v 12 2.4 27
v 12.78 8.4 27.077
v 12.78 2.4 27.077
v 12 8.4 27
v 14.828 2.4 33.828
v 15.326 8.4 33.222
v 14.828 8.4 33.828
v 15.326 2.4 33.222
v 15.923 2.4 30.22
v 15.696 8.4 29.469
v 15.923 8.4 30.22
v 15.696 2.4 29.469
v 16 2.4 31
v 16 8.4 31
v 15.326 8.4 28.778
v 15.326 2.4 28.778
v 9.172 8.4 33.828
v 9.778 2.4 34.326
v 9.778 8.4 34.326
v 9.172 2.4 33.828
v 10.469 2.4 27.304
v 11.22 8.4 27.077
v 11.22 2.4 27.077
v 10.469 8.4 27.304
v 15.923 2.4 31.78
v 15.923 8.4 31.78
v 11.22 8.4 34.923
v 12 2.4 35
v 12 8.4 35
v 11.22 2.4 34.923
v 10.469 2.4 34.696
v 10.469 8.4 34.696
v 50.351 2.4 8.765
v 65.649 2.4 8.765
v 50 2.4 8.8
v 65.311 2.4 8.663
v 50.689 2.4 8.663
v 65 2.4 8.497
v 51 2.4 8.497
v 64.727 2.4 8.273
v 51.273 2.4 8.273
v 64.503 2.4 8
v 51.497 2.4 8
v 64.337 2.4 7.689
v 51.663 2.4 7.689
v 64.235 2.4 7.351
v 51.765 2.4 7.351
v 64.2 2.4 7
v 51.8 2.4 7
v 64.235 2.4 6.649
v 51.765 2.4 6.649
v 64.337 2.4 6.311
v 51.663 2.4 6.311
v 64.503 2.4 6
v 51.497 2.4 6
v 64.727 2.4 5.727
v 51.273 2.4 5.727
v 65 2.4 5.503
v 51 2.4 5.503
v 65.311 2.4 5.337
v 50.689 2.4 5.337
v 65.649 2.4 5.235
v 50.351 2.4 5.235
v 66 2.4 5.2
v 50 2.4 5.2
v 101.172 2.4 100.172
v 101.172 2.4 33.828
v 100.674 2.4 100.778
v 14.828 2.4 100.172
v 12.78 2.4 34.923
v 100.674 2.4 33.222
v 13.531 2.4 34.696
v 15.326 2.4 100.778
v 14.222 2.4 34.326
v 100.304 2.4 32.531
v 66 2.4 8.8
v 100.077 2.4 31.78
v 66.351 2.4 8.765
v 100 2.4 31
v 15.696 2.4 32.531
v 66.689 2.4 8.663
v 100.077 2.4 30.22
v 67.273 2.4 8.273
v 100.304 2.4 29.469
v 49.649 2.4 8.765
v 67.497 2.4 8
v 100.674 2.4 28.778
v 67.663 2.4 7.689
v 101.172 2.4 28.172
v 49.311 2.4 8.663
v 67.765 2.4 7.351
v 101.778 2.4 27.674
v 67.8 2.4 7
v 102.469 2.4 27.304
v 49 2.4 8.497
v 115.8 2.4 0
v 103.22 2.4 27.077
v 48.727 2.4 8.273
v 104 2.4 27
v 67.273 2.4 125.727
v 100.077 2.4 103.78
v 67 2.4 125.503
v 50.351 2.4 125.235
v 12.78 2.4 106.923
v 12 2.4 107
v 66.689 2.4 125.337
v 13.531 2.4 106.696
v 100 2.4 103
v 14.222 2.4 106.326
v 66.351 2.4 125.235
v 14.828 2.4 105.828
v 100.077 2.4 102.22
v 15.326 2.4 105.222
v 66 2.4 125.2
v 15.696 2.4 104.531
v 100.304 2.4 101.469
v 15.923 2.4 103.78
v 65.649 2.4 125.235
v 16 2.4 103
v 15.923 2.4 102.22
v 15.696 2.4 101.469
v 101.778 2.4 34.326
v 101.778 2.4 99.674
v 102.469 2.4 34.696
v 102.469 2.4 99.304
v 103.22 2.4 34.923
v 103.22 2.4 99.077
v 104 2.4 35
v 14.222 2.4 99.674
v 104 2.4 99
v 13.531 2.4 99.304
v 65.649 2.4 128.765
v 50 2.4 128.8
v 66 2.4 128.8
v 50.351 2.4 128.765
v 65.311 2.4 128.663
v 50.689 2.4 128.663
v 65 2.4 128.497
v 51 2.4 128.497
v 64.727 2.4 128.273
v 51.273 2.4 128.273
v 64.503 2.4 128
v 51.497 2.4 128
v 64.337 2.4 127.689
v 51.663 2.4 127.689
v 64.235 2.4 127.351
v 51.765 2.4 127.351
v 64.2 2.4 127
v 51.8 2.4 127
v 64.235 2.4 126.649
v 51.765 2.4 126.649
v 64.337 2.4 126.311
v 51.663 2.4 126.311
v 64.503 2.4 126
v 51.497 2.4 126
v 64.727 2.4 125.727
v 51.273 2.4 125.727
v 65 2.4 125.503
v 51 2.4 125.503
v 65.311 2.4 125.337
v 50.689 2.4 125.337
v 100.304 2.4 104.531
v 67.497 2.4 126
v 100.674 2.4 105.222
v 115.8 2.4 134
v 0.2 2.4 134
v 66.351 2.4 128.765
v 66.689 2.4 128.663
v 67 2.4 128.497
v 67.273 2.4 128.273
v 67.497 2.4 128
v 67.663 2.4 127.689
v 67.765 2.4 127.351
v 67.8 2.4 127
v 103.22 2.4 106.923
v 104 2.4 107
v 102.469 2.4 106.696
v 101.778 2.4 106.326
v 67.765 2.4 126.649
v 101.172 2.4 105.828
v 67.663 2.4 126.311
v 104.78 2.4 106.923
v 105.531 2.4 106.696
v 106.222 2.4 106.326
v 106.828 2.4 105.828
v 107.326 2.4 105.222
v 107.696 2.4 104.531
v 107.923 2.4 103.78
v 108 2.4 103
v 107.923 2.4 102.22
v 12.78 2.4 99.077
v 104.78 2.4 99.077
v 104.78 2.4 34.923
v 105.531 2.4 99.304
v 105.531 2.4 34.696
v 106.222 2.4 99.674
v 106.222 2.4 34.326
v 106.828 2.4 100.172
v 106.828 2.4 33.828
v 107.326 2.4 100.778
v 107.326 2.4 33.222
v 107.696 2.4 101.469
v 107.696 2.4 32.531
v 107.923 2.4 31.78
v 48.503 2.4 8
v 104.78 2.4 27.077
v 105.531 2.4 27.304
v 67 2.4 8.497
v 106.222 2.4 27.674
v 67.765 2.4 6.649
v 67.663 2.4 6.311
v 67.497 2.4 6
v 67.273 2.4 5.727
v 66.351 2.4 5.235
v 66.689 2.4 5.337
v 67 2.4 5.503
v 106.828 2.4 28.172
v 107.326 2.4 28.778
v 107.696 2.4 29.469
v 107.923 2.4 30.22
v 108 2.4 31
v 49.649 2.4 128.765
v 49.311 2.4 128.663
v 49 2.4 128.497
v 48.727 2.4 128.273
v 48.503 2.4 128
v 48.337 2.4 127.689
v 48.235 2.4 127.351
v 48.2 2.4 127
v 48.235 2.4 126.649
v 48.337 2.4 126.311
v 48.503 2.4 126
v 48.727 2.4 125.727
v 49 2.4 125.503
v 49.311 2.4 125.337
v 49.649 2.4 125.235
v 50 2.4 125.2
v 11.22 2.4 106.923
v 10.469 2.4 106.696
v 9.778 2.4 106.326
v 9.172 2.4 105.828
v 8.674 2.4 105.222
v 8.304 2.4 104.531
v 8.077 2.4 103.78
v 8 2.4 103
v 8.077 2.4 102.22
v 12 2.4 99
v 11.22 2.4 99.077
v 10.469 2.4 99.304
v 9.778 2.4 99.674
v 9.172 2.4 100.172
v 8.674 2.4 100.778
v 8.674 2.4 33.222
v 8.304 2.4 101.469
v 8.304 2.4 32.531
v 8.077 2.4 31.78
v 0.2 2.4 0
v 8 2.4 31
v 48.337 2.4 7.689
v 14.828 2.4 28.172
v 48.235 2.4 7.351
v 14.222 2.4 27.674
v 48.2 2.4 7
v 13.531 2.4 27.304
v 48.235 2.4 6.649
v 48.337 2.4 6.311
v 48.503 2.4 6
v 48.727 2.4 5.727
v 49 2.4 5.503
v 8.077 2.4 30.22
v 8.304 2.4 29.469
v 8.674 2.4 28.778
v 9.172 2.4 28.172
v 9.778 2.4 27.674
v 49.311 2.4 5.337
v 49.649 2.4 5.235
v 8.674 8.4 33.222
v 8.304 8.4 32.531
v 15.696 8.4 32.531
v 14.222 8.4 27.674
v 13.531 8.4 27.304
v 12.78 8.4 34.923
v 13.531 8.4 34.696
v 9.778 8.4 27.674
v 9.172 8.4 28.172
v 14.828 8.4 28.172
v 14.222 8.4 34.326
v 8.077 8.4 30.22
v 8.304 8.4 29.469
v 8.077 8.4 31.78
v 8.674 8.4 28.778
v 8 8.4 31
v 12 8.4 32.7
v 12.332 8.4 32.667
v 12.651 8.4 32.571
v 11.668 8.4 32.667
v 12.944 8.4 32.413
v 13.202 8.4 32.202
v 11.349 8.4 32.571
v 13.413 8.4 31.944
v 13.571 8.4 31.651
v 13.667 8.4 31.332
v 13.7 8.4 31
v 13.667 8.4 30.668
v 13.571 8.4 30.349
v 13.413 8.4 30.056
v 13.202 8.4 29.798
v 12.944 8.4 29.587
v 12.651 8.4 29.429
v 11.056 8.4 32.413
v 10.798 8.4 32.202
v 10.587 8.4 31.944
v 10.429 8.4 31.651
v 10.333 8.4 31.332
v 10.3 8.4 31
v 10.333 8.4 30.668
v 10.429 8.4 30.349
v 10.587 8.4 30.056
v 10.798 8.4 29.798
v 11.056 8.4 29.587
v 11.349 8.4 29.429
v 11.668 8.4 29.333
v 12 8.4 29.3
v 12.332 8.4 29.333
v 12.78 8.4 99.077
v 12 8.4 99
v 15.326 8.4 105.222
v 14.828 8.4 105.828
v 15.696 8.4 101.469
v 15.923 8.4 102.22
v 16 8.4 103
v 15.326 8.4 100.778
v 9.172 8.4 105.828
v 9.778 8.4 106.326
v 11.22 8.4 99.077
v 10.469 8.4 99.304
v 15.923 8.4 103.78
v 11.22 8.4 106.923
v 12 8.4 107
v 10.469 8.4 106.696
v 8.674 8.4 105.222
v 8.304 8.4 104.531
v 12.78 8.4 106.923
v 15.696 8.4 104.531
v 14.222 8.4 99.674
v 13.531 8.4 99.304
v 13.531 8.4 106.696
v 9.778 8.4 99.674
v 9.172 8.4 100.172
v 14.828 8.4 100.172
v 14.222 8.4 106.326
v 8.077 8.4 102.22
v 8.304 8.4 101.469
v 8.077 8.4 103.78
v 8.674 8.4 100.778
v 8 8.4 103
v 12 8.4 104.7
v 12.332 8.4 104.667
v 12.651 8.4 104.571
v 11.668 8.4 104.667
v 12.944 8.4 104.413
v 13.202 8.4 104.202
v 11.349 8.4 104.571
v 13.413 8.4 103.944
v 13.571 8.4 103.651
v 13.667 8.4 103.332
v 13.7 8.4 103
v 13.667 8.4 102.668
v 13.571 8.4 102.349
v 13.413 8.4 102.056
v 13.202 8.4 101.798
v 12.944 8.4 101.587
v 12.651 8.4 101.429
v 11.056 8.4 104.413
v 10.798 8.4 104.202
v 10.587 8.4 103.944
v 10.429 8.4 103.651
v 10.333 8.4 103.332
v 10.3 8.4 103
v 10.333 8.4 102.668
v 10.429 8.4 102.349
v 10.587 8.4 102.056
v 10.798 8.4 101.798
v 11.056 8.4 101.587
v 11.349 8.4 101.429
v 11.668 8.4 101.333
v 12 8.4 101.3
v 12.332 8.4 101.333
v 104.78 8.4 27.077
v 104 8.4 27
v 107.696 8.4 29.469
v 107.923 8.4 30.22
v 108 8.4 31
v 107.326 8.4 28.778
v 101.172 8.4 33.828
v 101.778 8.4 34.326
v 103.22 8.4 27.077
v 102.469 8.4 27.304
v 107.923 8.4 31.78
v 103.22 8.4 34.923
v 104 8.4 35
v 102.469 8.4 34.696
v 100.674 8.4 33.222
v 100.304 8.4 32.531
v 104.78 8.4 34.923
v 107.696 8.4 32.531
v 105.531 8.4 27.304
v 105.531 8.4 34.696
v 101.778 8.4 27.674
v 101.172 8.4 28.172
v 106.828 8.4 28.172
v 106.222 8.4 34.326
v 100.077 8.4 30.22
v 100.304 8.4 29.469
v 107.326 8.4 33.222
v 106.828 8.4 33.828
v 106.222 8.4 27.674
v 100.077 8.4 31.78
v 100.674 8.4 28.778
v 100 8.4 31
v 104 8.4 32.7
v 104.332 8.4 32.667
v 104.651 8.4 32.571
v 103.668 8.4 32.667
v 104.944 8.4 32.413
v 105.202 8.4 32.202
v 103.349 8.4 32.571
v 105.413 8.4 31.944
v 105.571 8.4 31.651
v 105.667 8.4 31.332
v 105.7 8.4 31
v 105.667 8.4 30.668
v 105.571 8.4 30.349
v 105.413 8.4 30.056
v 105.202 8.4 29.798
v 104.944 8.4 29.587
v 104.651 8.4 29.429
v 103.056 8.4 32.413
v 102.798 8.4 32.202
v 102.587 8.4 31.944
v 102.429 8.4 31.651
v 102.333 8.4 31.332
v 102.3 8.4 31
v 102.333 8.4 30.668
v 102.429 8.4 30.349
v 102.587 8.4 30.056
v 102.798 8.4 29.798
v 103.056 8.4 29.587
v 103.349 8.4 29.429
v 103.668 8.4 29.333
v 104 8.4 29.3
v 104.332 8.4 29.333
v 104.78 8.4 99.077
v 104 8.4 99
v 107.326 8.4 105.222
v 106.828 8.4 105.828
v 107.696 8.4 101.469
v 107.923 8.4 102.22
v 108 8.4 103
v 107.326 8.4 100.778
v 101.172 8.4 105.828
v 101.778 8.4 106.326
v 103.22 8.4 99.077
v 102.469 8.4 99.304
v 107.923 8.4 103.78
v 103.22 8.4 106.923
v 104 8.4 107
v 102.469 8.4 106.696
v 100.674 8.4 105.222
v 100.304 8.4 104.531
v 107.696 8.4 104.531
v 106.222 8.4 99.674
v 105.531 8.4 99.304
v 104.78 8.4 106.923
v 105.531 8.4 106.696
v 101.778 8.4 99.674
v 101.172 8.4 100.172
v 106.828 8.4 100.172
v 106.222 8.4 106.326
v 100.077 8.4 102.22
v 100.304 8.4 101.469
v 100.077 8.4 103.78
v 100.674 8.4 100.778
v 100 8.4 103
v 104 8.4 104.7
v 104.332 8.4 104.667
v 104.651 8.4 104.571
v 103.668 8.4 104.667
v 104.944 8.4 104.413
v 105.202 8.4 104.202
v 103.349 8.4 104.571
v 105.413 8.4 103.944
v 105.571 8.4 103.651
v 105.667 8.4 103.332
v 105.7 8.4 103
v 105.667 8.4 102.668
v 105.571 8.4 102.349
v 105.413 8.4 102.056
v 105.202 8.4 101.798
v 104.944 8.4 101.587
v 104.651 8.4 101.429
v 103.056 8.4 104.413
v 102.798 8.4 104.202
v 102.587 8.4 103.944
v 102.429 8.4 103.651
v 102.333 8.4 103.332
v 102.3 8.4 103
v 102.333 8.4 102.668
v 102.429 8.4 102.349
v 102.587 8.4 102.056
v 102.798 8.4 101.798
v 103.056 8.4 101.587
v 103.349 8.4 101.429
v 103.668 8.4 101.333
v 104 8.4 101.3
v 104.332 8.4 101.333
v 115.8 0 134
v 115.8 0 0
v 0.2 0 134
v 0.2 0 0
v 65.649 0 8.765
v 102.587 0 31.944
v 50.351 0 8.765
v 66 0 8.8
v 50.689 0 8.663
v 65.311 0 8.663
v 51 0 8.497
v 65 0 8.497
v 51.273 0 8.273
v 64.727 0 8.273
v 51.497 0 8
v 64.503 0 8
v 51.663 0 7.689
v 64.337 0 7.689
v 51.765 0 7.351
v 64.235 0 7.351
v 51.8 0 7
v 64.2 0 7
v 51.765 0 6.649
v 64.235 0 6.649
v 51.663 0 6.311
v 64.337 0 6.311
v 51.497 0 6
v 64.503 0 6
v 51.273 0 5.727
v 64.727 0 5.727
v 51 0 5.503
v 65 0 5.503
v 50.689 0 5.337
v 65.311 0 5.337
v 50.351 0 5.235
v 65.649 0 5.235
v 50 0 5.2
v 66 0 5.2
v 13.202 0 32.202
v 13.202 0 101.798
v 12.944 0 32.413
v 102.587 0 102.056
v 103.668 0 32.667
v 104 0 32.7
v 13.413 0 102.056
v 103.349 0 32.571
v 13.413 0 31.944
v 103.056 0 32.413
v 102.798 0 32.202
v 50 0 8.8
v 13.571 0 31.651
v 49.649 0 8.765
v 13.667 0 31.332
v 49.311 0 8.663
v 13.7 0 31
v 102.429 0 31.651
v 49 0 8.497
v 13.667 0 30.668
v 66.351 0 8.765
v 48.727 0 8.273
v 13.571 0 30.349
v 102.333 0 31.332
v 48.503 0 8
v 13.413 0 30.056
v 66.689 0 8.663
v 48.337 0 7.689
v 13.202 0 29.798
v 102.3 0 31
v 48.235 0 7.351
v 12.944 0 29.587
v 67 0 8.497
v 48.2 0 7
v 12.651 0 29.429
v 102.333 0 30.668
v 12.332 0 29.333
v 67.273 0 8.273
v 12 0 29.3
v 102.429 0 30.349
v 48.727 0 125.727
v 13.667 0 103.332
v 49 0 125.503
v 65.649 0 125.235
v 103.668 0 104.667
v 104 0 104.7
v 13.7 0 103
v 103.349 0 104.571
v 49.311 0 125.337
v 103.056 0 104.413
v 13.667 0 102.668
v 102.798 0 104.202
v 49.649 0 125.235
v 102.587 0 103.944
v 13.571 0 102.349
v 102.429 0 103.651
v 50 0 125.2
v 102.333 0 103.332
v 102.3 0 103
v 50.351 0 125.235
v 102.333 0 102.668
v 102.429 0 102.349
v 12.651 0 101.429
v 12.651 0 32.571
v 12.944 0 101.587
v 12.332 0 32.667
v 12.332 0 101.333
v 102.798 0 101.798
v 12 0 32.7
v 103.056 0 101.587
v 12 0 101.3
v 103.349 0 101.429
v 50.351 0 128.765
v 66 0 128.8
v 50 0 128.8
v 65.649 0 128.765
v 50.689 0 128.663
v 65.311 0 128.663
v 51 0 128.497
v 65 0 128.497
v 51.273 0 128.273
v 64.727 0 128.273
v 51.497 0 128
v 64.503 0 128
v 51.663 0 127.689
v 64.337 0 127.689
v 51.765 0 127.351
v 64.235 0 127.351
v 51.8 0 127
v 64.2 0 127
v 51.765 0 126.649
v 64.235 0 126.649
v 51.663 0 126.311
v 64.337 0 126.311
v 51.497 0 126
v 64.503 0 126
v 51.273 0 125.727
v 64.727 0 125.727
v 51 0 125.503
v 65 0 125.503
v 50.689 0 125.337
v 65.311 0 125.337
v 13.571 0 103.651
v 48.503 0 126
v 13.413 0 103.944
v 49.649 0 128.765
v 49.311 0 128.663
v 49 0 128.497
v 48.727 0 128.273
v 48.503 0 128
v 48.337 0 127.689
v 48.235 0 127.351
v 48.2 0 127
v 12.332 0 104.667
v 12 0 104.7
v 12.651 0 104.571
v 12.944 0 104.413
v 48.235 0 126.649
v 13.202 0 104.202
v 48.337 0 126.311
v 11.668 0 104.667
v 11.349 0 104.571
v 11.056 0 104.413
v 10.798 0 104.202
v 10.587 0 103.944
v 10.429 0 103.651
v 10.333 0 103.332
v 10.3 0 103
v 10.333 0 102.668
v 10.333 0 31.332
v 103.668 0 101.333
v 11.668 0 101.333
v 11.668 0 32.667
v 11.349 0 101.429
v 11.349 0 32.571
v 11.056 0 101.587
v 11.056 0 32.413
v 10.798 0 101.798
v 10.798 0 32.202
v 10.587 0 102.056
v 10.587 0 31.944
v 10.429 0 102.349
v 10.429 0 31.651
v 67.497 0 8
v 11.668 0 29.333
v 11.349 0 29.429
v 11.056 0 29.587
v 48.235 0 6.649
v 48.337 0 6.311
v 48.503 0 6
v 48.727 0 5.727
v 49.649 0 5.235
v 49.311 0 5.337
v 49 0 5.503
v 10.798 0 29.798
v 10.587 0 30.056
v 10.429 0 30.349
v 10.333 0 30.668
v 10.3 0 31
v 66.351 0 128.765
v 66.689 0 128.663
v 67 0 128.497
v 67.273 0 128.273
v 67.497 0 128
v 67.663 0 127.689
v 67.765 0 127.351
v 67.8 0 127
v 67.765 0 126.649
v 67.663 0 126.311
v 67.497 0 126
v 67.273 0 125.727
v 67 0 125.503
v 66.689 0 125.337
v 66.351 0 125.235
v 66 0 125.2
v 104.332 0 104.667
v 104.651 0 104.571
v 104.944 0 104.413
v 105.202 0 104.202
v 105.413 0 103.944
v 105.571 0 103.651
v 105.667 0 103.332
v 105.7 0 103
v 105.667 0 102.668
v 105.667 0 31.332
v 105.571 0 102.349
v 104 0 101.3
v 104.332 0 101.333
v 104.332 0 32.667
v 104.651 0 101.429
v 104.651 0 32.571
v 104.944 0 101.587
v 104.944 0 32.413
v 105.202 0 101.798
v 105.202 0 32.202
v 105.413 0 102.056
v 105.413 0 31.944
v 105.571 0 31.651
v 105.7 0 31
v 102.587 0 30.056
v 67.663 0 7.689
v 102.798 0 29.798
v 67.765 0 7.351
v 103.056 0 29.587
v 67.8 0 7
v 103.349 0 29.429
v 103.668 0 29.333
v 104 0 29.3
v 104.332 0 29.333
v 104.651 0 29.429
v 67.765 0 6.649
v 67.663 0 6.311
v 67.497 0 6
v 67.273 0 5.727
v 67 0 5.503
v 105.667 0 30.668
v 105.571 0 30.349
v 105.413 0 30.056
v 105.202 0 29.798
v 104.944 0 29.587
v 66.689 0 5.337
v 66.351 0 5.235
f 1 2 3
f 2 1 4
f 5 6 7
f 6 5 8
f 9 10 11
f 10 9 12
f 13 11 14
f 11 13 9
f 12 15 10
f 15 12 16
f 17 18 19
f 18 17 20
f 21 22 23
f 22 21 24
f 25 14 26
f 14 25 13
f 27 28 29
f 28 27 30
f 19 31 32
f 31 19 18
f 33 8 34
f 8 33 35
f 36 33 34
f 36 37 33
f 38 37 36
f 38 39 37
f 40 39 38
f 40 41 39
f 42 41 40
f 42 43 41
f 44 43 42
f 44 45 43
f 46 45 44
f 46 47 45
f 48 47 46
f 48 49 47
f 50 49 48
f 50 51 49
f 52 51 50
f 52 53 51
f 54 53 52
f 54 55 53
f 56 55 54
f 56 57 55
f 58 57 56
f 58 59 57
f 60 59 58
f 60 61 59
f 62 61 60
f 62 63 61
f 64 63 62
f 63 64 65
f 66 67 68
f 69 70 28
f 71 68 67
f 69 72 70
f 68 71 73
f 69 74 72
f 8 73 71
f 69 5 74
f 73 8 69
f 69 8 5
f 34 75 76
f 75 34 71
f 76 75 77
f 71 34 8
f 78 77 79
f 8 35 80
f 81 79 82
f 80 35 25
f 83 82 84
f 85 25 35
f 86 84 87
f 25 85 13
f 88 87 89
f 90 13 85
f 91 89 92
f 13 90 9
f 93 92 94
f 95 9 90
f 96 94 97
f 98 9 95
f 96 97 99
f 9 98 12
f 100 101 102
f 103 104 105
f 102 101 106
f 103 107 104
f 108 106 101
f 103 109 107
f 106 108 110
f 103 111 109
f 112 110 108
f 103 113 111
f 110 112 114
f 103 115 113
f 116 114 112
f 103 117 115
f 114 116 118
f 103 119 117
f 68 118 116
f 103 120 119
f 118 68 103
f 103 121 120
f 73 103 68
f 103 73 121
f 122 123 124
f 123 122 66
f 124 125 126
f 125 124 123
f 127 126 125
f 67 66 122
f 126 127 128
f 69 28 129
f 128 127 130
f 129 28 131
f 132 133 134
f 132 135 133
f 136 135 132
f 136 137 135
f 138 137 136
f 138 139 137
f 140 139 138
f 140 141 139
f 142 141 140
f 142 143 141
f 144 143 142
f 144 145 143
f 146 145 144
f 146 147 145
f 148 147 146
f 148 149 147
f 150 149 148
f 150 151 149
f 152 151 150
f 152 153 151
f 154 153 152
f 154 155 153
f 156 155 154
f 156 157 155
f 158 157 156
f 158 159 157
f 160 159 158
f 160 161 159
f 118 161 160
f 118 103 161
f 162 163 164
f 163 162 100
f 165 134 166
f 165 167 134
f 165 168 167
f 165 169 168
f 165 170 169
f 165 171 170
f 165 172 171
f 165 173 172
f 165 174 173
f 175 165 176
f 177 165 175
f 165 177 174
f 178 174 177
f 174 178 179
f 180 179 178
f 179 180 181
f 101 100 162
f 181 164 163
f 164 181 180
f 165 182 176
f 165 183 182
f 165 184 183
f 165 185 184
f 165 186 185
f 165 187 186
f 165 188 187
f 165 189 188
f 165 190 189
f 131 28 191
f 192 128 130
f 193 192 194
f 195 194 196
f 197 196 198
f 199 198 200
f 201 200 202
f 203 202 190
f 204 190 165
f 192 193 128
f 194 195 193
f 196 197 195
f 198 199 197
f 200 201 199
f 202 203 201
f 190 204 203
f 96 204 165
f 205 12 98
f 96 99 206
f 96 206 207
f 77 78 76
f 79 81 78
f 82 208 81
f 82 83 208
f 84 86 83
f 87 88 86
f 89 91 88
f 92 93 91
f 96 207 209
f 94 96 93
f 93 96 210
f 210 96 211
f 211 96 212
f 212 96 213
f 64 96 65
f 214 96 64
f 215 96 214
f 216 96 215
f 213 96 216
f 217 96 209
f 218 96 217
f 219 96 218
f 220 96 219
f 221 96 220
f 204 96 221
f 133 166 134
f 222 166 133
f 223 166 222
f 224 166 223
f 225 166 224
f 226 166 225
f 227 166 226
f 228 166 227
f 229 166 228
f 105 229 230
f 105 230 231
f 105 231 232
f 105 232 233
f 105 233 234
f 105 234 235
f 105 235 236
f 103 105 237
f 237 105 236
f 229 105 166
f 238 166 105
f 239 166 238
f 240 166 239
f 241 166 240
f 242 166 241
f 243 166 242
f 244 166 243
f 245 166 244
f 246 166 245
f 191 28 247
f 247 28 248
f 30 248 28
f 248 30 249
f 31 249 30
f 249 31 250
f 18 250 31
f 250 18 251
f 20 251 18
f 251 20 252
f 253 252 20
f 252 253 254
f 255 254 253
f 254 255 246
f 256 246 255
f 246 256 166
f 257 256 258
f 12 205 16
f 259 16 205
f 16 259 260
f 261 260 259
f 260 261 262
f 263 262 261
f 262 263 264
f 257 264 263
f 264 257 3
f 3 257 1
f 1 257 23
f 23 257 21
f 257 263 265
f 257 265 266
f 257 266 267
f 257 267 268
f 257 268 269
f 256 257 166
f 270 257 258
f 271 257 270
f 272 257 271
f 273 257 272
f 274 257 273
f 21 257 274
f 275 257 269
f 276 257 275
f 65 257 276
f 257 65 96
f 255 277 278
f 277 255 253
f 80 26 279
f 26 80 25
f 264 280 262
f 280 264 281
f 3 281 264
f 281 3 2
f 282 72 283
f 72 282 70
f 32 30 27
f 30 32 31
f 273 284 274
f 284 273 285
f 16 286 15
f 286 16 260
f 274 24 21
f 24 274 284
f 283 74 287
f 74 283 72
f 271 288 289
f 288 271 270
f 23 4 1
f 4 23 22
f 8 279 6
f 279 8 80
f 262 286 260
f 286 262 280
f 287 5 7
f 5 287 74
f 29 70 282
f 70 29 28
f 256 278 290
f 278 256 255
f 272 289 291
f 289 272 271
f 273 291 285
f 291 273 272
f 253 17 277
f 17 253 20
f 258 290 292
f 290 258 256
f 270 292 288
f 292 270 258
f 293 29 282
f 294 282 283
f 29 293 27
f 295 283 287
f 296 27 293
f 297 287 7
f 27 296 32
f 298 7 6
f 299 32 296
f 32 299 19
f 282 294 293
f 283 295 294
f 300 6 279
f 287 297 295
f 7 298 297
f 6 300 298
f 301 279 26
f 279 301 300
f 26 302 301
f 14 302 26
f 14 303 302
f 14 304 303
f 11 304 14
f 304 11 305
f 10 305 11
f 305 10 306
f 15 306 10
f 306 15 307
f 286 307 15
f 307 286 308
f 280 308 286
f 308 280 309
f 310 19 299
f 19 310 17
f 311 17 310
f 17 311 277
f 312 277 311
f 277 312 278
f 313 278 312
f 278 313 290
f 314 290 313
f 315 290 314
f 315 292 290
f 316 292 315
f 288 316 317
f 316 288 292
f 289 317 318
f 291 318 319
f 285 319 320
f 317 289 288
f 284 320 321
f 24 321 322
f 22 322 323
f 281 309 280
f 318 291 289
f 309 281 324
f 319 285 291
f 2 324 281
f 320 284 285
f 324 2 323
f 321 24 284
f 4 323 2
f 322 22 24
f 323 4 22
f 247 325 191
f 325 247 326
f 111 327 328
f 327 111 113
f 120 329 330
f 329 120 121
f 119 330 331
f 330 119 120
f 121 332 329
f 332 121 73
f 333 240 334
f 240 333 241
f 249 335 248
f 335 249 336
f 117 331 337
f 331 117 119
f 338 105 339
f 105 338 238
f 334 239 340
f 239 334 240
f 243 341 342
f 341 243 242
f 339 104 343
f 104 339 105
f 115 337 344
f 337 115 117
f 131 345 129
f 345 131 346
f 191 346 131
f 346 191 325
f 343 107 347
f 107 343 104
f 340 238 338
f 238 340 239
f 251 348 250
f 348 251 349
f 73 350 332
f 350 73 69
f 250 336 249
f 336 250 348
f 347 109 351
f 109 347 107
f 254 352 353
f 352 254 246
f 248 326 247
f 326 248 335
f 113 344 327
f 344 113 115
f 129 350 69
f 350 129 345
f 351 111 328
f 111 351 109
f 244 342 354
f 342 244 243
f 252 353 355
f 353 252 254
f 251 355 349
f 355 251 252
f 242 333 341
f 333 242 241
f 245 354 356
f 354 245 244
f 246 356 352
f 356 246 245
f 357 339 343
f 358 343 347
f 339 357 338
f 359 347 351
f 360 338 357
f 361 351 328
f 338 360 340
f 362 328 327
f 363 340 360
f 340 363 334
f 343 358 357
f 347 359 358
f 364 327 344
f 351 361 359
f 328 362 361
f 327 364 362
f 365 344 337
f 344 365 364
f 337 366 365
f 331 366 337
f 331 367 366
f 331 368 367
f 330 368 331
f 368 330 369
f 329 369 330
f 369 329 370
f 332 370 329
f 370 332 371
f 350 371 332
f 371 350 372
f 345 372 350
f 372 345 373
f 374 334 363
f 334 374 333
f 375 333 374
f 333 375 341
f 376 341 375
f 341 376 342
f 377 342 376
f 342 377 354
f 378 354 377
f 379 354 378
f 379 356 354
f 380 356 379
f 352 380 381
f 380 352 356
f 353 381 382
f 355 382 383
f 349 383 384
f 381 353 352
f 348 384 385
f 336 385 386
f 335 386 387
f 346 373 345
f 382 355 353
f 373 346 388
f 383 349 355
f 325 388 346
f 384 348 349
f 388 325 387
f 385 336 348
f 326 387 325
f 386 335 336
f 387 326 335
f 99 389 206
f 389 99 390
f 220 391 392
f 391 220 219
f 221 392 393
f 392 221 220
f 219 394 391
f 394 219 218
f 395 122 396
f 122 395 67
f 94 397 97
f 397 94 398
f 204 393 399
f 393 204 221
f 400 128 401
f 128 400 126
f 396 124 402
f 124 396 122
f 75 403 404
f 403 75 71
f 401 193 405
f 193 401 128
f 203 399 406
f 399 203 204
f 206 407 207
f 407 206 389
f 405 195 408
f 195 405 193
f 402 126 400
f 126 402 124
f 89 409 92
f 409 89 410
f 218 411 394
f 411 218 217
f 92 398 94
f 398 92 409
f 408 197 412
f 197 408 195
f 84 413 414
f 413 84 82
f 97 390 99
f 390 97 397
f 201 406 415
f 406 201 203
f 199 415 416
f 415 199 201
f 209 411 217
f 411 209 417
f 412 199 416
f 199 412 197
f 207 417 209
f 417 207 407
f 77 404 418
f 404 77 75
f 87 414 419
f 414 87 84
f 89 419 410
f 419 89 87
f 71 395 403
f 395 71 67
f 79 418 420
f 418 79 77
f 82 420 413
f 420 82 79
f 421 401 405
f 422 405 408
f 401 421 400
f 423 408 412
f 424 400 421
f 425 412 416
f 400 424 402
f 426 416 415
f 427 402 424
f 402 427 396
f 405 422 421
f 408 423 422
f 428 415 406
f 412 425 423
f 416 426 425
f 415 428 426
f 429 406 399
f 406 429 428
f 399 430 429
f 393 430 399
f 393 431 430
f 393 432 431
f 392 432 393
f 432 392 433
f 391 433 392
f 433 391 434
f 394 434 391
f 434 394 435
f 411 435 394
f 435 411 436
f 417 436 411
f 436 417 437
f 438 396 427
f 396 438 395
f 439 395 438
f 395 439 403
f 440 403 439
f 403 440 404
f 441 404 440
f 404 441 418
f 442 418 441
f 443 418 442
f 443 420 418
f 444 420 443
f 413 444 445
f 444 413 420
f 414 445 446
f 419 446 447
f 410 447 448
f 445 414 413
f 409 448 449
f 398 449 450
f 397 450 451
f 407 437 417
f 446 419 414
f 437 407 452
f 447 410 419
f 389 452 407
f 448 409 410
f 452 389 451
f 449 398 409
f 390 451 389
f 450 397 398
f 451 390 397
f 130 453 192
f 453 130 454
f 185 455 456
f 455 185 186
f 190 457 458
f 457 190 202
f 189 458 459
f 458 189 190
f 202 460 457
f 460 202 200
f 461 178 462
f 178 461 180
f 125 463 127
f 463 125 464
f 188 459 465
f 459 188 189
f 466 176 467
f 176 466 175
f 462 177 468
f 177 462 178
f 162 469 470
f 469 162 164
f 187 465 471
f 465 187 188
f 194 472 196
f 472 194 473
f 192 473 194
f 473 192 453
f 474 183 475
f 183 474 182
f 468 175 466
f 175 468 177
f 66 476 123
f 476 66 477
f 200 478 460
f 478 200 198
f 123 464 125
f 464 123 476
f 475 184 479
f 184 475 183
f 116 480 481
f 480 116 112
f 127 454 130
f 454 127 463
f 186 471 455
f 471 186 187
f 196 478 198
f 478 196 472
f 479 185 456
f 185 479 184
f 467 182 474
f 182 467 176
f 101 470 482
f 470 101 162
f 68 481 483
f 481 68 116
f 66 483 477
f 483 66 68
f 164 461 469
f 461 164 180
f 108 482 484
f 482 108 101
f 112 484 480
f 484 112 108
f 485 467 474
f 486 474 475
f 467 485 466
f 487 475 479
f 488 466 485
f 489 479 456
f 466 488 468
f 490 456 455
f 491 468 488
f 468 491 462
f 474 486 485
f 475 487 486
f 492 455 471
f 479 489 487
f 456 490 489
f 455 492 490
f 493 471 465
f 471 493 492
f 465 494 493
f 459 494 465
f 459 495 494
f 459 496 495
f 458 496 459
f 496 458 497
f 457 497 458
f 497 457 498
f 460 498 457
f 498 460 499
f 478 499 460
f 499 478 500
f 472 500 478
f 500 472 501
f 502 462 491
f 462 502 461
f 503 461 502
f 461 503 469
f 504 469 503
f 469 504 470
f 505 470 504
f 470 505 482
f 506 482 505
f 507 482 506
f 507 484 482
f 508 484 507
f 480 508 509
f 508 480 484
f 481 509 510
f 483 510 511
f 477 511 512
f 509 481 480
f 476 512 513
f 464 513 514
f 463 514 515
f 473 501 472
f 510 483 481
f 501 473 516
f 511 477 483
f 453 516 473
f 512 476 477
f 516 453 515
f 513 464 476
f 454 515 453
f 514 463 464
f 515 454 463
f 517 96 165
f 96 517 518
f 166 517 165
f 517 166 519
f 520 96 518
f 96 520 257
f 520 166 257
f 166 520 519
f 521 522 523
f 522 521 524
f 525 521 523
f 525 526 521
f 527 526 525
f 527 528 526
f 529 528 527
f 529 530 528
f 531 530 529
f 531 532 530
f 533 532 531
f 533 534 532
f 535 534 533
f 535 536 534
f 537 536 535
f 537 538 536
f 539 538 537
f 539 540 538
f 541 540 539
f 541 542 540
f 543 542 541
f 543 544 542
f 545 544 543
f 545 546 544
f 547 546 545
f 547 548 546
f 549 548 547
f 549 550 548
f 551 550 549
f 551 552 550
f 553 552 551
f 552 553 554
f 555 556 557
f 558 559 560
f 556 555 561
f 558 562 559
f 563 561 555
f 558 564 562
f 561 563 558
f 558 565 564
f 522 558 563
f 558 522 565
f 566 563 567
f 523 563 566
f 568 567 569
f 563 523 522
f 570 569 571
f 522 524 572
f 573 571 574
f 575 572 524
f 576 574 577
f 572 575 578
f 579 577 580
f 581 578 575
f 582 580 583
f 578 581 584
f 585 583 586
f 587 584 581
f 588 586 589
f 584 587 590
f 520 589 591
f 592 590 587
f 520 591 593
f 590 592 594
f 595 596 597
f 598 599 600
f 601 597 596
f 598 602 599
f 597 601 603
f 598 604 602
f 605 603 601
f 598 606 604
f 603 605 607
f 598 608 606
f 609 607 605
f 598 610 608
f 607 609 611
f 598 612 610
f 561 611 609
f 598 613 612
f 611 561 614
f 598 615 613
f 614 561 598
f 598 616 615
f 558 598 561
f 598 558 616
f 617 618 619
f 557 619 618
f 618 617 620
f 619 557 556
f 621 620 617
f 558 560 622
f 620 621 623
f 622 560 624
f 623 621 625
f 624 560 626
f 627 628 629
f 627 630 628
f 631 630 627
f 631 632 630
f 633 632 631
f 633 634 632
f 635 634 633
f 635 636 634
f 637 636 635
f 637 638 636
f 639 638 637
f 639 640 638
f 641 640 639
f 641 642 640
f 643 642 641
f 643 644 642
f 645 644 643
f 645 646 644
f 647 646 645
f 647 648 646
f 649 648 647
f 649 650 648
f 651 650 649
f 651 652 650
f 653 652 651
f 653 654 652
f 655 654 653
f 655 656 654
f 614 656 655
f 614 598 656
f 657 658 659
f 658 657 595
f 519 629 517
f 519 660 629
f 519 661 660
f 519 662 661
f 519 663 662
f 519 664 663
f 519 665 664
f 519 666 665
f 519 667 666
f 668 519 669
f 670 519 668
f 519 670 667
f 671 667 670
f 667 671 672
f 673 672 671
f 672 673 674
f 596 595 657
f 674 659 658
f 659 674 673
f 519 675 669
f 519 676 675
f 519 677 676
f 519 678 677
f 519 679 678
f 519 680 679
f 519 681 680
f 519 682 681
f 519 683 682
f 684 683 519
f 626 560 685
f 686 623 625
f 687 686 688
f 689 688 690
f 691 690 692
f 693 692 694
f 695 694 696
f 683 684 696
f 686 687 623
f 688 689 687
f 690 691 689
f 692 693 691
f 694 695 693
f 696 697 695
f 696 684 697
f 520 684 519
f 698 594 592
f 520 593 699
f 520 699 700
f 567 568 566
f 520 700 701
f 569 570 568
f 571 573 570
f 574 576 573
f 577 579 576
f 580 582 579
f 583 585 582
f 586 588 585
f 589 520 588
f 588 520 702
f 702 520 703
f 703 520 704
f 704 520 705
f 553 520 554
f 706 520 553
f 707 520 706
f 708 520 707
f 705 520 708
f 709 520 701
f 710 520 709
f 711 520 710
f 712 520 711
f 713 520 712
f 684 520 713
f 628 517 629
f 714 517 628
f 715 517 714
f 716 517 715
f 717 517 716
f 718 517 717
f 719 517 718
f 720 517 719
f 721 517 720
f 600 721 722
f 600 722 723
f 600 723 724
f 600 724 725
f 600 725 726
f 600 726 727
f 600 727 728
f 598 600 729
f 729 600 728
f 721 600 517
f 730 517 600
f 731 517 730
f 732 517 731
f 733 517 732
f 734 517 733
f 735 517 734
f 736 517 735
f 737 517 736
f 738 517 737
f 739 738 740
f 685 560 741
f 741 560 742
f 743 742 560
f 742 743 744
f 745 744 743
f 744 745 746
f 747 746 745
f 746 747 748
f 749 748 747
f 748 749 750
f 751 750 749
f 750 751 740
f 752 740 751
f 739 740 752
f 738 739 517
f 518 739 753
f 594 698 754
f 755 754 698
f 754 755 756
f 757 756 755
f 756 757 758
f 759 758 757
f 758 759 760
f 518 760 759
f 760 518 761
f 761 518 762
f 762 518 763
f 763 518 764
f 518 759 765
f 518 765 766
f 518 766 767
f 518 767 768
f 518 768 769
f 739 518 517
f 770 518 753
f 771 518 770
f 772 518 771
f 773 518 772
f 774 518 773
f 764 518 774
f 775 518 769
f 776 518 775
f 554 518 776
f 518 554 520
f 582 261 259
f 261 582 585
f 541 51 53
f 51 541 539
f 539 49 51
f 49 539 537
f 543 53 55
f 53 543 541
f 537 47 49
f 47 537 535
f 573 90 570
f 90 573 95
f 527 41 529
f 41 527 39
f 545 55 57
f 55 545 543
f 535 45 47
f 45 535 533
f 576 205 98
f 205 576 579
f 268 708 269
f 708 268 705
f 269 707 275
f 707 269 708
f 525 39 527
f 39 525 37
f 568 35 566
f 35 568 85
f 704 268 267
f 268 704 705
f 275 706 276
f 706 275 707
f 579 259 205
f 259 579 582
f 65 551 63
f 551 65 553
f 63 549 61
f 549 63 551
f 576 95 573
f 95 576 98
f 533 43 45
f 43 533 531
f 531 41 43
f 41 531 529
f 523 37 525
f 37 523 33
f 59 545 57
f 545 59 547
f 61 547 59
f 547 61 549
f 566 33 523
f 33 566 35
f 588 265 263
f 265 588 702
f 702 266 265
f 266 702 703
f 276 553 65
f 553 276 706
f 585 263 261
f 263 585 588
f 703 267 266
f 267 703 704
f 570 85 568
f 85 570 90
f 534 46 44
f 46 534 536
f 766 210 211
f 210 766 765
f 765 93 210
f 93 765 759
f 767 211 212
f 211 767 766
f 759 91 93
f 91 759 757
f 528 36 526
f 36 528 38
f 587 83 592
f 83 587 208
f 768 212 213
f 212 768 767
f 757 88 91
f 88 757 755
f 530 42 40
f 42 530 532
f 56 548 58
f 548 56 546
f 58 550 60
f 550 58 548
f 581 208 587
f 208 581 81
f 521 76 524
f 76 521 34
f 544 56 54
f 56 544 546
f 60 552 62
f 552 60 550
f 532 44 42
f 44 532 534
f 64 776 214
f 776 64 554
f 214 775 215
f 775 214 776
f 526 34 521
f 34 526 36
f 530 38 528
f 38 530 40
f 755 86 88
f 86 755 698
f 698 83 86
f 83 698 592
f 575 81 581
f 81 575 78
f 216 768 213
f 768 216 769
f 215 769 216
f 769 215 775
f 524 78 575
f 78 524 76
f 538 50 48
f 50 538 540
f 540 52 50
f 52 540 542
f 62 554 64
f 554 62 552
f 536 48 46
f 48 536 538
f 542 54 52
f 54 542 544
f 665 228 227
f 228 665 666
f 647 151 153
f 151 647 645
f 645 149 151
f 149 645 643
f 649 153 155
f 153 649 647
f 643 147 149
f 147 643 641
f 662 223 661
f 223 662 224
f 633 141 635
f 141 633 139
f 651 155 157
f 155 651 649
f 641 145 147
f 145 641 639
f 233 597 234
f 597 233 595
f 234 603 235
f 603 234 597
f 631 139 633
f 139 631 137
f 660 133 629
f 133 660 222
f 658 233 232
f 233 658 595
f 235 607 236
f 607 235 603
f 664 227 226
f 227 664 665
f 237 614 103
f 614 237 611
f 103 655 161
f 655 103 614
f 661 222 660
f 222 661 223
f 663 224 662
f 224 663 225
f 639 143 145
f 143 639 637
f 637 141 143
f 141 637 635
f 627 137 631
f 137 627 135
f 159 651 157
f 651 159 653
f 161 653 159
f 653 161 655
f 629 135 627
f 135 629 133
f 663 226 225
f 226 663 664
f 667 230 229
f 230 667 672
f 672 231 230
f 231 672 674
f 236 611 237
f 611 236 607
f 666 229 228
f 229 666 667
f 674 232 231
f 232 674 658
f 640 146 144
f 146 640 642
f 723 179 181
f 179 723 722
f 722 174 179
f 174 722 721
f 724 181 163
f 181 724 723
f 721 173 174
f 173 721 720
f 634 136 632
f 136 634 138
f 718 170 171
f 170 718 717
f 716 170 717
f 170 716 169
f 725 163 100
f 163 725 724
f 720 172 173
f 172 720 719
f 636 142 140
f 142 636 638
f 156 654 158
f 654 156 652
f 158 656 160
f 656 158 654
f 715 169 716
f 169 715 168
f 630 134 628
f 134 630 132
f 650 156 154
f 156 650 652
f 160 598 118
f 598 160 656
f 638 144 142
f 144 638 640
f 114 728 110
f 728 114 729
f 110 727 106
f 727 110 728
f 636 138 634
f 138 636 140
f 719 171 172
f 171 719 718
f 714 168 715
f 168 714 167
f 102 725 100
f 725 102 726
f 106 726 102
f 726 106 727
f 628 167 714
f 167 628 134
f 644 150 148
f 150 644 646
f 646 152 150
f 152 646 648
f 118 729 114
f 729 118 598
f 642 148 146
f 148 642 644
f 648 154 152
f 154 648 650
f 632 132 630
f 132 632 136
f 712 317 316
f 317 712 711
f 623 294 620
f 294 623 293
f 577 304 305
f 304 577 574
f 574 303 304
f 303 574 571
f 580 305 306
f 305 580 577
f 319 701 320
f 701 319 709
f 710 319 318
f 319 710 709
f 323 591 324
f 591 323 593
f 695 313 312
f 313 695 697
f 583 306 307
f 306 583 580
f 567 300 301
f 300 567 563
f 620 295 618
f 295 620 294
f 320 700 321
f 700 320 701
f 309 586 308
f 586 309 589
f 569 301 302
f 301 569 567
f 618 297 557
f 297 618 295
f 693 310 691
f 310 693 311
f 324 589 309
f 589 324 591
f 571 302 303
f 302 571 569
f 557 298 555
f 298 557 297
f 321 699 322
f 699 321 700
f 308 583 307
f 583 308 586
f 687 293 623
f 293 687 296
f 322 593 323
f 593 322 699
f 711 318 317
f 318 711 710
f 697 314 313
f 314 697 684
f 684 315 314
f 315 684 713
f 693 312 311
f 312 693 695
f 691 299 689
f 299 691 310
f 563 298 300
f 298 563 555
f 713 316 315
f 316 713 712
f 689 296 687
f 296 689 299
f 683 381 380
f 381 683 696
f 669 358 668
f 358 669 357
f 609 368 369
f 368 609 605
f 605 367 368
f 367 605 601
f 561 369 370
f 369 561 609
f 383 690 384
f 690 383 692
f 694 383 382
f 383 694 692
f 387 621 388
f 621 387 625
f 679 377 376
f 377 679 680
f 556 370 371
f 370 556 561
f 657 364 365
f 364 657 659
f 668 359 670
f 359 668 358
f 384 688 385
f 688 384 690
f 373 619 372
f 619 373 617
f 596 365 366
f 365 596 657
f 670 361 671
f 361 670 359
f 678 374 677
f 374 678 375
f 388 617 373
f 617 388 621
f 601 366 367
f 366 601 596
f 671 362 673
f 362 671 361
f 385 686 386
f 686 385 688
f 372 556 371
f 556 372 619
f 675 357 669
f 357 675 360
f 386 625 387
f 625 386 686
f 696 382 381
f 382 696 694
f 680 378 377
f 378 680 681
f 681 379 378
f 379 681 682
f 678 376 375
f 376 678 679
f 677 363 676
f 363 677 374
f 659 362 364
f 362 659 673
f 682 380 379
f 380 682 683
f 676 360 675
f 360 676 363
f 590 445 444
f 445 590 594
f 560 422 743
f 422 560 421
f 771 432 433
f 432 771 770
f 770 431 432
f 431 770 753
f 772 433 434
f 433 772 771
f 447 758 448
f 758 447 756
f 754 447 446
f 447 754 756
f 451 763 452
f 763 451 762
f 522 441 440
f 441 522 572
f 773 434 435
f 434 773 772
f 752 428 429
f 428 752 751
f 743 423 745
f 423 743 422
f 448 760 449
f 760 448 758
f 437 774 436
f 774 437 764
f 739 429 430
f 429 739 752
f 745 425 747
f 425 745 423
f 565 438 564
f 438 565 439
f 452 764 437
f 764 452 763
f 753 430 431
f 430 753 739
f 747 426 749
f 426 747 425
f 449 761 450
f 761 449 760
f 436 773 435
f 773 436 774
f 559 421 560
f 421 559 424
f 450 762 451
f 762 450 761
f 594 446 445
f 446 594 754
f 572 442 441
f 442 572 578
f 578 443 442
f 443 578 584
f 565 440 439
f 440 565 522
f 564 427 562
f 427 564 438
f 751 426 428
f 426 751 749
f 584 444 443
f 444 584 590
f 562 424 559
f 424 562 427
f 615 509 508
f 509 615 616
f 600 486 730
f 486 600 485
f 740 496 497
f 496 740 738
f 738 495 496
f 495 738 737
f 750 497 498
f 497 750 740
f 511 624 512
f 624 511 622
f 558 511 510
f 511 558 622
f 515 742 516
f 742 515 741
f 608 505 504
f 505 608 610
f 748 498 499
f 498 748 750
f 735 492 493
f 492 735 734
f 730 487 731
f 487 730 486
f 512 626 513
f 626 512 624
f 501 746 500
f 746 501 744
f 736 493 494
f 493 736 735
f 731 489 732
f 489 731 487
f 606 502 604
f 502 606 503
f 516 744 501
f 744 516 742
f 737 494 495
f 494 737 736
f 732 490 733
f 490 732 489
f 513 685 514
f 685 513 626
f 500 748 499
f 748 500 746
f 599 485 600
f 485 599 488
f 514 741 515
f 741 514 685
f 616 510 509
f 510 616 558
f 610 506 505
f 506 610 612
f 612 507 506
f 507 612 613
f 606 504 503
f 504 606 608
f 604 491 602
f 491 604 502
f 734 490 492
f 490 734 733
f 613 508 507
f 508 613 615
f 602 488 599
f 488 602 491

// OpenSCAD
// file: ../params.scad
// Общие размеры первой итерации: один отсек 3.5" и детали вокруг него.
// Корпус диска — SFF-8301, таблица 3-1, класс высоты 26.10 мм (максимум).
// Положение разъёма SATA сюда не зашито: его снимают калибром gauge.scad
// с конкретного диска и только потом переносят в окно салазок.

drive_width = 101.60;
drive_height = 26.10;
drive_length = 147.00;

wall = 4.0;
floor_t = 4.0;
lip_t = 3.0;
nib = 4.0;
side_clearance = 0.8;
top_clearance = 1.5;

front_gap = 3.0;
plate_t = 8.0;
front_extra = front_gap + plate_t;

pusher_d = 4.4;
m3_clear = 3.4;
m3_pilot = 2.6;
m3_nut_af = 5.5;
m3_nut_t = 2.8;

cavity_w = drive_width + side_clearance;
outer_w = cavity_w + 2 * wall;
wall_h = drive_height + top_clearance;
body_z = drive_length + front_extra;

strap_z = 18;
strap_t = 4.0;
strap_foot = 14.0;

plate_screw_x = [14, drive_width - 14];
plate_z0 = drive_length + front_gap;
plate_screw_z = plate_z0 + plate_t / 2;
plate_bar_h = 10;
tower_w = 28;
tower_x = drive_width / 2 - tower_w / 2;

sled_w = 78;
sled_h = 48;
sled_t = 8;
sled_window_w = 50;
sled_window_h = 18;
sled_hole_inset = 6;

// Каркас 1U. Шаг EIA — 44.45 мм, уголок 44.0 мм, чтобы соседний юнит не тёрся.
// Гнездо 8.4 мм принимает трубку до 8 мм. Хомут тянет её к внешней стенке гнезда.
// При rod_d = 6 между трубками 29 мм: пол корзины 1.6 мм, диск 26.1 мм, воздух ~1 мм.
// При 8 мм диск 26.1 мм в этот юнит уже не входит.
unit_h = 44.0;
rod_d = 6;
socket_d = 8.4;
// 10 мм хватает, чтобы трубка села и хомут её зажал. Столбик тогда 12 мм,
// и четыре корзины остаются внутри просвета 450 мм.
socket_depth = 10;
socket_wall = 1.6;
skin = 0.8;
foot = 1.6;
roof = 1.4;
tie_w = 3.2;
// Просвет между направляющими стойки 19 дюймов — 450 мм.
opening_w = 450;
bay_count = 4;
bay_gap = 1.0;
basket_wall = 1.6;
basket_clear = 0.6;
rail_t = 1.6;
// Торец разъёма выступает за ближнюю трубку к каретке, чтобы трубка не перекрыла SATA.
plug_overhang = 16;
stop_margin = 14;

socket_r = socket_d / 2;
post_x = socket_depth + 2;
axis_inset = skin + socket_r;
bottom_axis_y = foot + socket_r;
top_axis_y = unit_h - roof - socket_r;
depth_z0 = axis_inset + socket_r + socket_wall;
post_z = depth_z0 + socket_depth;
basket_w = drive_width + basket_clear + 2 * basket_wall;
inner_w = bay_count * basket_w + (bay_count - 1) * bay_gap;
frame_w = inner_w + 2 * post_x;
rod_span = drive_length - plug_overhang + stop_margin;
frame_depth = rod_span + 2 * axis_inset;
rod_y0 = foot + rod_d / 2;
rod_y1 = unit_h - roof - rod_d / 2;
rod_gap = (rod_y1 - rod_d / 2) - (rod_y0 + rod_d / 2);

// KW11-3Z: корпус около 19.8 x 10.2 x 6.4 мм, два отверстия 2.35–2.5 мм
// с шагом 9.5 мм под винты M2.
switch_hole_d = 2.5;
switch_pitch = 9.5;

$fn = 32;
// file: params.scad
// Наборный ярус. Стоит рядом с cad/rack.scad и ту стойку не заменяет.
// Диск, юнит, гнездо 8.4 мм и ширина четырёх отсеков — из ../params.scad.
// Здесь их не копируют: если правка там, ярус подхватит её сам.
include <../params.scad>

$fn = 32;

// Сборка на трубке 6 мм. Гнездо принимает и 8 мм, но тогда диск 26.1 мм
// в юнит 44 мм уже не входит: между трубками остаётся около 29 мм.
m4_clear = 4.4;
board_t = 1.6;
standoff_h = 6;
comp_max = 10;
tray_t = 2.4;
tie_hole = 3.6;

// Плата Pi 4: 85 × 56 мм. Отверстия Ø2.7 под M2.5, шаг 58 × 49,
// отступ 3.5 от левого края и от обеих кромок стороны 56 мм.
// Чертёж Raspberry Pi Ltd RP-008343-DS-1. В пластике проход 2.9 мм.
// https://pip-assets.raspberrypi.com/categories/545-raspberry-pi-4-model-b/documents/RP-008343-DS-1-raspberry-pi-4-mechanical-drawing.pdf
pi_l = 85;
pi_w = 56;
pi_hole_d = 2.9;
pi_pitch_x = 58;
pi_pitch_y = 49;
pi_inset = 3.5;

sata_l = 100;
sata_w = 80;
ctrl_l = 100;
ctrl_w = 100;

// Шпилька M4 не встаёт рядом с гнездом в столбике 12 мм,
// а столбик шире раздвигает каркас за просвет 450 мм.
// Поэтому колодец шпильки — в переднем блоке, гнёзда за ним по глубине.
rod_hole_x = post_x / 2;
rod_hole_z = 5;
socket_gap = 1.6;

width_axis_z = rod_hole_z + m4_clear / 2 + socket_gap + socket_r;
depth_bore_z = width_axis_z + socket_r + socket_gap;
stack_post_z = depth_bore_z + socket_depth;
depth_axis_x = post_x / 2;

// Ложемент. Его z = 0 — передний край ушка.
ear_past = rod_d / 2 + 4;
cradle_lip_t = 2.4;
cradle_cheek_t = 2.4;
cradle_cheek = 4;
cradle_gap_tube = 1.0;
cradle_rear_inset = 22;
cradle_lip_h = 8;

cradle_z_front = ear_past;
cradle_z_drive0 = cradle_z_front + rod_d / 2 + cradle_gap_tube + cradle_lip_t;
cradle_z_drive1 = cradle_z_drive0 + drive_length;
cradle_z_rear = cradle_z_drive1 - cradle_rear_inset;
cradle_z_end = cradle_z_drive1 + cradle_cheek_t;

// Передняя трубка яруса совпадает с гнездом уголка.
cradle_z0 = width_axis_z - cradle_z_front;
drive_z0 = cradle_z0 + cradle_z_drive0;
drive_z1 = cradle_z0 + cradle_z_drive1;
mid_rail_z = cradle_z0 + cradle_z_rear;
cradle_y = rod_y0 + rod_d / 2;

// Задний отсек: кабели и платы лёжа. Договор просит не меньше 90 мм.
// Контрольная плата 100 мм, поэтому между осями трубок лотка 120 мм.
cable_gap = 36;
tray_span = 120;
bay_rail_z = drive_z1 + cable_gap;
rear_width_z = bay_rail_z + tray_span;
stack_depth = rear_width_z + width_axis_z;
tray_len = tray_span + 2 * ear_past;
tray_z0 = bay_rail_z - ear_past;

width_tube_len = frame_w - 2 * (post_x - socket_depth);
depth_tube_len = stack_depth - 2 * depth_bore_z;
rail_end_gap = 0.4;
rail_x0 = depth_axis_x + rod_d / 2 + rail_end_gap;
cross_tube_len = frame_w - 2 * rail_x0;

// Хомут рельса. Оси локальные, сборка совмещает их с трубками.
clamp_dx = 10;
clamp_cz = 12;

stud_extra = 16;
ear_out = 16;
ear_t = 3.2;

sata_tray_w = sata_l + 16;
ctrl_tray_w = ctrl_l + 16;
pi_tray_w = pi_l + 16;

bay_clear = (rear_width_z - rod_d / 2) - drive_z1;
board_stack = tray_t + standoff_h + board_t + comp_max;
// main file
// Лоток сата-платы одного яруса. Плитой вниз, бобышки вверх.
// Плата 100 × 80 лежит длинной стороной поперёк яруса.
// Отверстия M3: (4, 4), (96, 4), (4, 76), (96, 76) от левого ближнего угла платы.
// Бобышка 6 мм — стойка. Винт M3 сверху, гайка снизу плиты. Резьбу не печатать.
// Ушки ложатся на заднюю нижнюю трубку и на трубку отсека.
include <params.scad>

module sata_tray() {
    z0 = ear_past + rod_d / 2 + ((tray_span - rod_d) - sata_w) / 2;
    x0 = (sata_tray_w - sata_l) / 2;

    difference() {
        union() {
            translate([0.2, 0, 0])
                cube([sata_tray_w - 0.4, tray_t, tray_len]);
            for (hx = [4, 96], hz = [4, 76])
                translate([x0 + hx, tray_t, z0 + hz])
                    rotate([-90, 0, 0])
                        cylinder(h = standoff_h, d = 8);
        }

        for (z = [ear_past, ear_past + tray_span])
            for (dx = [-8, 8])
                translate([sata_tray_w / 2 + dx, -0.2, z])
                    rotate([-90, 0, 0])
                        cylinder(h = tray_t + 0.4, d = tie_hole);

        for (hx = [4, 96], hz = [4, 76])
            translate([x0 + hx, -0.2, z0 + hz])
                rotate([-90, 0, 0])
                    cylinder(h = tray_t + standoff_h + 0.4, d = m3_clear);
    }
}

sata_tray();
